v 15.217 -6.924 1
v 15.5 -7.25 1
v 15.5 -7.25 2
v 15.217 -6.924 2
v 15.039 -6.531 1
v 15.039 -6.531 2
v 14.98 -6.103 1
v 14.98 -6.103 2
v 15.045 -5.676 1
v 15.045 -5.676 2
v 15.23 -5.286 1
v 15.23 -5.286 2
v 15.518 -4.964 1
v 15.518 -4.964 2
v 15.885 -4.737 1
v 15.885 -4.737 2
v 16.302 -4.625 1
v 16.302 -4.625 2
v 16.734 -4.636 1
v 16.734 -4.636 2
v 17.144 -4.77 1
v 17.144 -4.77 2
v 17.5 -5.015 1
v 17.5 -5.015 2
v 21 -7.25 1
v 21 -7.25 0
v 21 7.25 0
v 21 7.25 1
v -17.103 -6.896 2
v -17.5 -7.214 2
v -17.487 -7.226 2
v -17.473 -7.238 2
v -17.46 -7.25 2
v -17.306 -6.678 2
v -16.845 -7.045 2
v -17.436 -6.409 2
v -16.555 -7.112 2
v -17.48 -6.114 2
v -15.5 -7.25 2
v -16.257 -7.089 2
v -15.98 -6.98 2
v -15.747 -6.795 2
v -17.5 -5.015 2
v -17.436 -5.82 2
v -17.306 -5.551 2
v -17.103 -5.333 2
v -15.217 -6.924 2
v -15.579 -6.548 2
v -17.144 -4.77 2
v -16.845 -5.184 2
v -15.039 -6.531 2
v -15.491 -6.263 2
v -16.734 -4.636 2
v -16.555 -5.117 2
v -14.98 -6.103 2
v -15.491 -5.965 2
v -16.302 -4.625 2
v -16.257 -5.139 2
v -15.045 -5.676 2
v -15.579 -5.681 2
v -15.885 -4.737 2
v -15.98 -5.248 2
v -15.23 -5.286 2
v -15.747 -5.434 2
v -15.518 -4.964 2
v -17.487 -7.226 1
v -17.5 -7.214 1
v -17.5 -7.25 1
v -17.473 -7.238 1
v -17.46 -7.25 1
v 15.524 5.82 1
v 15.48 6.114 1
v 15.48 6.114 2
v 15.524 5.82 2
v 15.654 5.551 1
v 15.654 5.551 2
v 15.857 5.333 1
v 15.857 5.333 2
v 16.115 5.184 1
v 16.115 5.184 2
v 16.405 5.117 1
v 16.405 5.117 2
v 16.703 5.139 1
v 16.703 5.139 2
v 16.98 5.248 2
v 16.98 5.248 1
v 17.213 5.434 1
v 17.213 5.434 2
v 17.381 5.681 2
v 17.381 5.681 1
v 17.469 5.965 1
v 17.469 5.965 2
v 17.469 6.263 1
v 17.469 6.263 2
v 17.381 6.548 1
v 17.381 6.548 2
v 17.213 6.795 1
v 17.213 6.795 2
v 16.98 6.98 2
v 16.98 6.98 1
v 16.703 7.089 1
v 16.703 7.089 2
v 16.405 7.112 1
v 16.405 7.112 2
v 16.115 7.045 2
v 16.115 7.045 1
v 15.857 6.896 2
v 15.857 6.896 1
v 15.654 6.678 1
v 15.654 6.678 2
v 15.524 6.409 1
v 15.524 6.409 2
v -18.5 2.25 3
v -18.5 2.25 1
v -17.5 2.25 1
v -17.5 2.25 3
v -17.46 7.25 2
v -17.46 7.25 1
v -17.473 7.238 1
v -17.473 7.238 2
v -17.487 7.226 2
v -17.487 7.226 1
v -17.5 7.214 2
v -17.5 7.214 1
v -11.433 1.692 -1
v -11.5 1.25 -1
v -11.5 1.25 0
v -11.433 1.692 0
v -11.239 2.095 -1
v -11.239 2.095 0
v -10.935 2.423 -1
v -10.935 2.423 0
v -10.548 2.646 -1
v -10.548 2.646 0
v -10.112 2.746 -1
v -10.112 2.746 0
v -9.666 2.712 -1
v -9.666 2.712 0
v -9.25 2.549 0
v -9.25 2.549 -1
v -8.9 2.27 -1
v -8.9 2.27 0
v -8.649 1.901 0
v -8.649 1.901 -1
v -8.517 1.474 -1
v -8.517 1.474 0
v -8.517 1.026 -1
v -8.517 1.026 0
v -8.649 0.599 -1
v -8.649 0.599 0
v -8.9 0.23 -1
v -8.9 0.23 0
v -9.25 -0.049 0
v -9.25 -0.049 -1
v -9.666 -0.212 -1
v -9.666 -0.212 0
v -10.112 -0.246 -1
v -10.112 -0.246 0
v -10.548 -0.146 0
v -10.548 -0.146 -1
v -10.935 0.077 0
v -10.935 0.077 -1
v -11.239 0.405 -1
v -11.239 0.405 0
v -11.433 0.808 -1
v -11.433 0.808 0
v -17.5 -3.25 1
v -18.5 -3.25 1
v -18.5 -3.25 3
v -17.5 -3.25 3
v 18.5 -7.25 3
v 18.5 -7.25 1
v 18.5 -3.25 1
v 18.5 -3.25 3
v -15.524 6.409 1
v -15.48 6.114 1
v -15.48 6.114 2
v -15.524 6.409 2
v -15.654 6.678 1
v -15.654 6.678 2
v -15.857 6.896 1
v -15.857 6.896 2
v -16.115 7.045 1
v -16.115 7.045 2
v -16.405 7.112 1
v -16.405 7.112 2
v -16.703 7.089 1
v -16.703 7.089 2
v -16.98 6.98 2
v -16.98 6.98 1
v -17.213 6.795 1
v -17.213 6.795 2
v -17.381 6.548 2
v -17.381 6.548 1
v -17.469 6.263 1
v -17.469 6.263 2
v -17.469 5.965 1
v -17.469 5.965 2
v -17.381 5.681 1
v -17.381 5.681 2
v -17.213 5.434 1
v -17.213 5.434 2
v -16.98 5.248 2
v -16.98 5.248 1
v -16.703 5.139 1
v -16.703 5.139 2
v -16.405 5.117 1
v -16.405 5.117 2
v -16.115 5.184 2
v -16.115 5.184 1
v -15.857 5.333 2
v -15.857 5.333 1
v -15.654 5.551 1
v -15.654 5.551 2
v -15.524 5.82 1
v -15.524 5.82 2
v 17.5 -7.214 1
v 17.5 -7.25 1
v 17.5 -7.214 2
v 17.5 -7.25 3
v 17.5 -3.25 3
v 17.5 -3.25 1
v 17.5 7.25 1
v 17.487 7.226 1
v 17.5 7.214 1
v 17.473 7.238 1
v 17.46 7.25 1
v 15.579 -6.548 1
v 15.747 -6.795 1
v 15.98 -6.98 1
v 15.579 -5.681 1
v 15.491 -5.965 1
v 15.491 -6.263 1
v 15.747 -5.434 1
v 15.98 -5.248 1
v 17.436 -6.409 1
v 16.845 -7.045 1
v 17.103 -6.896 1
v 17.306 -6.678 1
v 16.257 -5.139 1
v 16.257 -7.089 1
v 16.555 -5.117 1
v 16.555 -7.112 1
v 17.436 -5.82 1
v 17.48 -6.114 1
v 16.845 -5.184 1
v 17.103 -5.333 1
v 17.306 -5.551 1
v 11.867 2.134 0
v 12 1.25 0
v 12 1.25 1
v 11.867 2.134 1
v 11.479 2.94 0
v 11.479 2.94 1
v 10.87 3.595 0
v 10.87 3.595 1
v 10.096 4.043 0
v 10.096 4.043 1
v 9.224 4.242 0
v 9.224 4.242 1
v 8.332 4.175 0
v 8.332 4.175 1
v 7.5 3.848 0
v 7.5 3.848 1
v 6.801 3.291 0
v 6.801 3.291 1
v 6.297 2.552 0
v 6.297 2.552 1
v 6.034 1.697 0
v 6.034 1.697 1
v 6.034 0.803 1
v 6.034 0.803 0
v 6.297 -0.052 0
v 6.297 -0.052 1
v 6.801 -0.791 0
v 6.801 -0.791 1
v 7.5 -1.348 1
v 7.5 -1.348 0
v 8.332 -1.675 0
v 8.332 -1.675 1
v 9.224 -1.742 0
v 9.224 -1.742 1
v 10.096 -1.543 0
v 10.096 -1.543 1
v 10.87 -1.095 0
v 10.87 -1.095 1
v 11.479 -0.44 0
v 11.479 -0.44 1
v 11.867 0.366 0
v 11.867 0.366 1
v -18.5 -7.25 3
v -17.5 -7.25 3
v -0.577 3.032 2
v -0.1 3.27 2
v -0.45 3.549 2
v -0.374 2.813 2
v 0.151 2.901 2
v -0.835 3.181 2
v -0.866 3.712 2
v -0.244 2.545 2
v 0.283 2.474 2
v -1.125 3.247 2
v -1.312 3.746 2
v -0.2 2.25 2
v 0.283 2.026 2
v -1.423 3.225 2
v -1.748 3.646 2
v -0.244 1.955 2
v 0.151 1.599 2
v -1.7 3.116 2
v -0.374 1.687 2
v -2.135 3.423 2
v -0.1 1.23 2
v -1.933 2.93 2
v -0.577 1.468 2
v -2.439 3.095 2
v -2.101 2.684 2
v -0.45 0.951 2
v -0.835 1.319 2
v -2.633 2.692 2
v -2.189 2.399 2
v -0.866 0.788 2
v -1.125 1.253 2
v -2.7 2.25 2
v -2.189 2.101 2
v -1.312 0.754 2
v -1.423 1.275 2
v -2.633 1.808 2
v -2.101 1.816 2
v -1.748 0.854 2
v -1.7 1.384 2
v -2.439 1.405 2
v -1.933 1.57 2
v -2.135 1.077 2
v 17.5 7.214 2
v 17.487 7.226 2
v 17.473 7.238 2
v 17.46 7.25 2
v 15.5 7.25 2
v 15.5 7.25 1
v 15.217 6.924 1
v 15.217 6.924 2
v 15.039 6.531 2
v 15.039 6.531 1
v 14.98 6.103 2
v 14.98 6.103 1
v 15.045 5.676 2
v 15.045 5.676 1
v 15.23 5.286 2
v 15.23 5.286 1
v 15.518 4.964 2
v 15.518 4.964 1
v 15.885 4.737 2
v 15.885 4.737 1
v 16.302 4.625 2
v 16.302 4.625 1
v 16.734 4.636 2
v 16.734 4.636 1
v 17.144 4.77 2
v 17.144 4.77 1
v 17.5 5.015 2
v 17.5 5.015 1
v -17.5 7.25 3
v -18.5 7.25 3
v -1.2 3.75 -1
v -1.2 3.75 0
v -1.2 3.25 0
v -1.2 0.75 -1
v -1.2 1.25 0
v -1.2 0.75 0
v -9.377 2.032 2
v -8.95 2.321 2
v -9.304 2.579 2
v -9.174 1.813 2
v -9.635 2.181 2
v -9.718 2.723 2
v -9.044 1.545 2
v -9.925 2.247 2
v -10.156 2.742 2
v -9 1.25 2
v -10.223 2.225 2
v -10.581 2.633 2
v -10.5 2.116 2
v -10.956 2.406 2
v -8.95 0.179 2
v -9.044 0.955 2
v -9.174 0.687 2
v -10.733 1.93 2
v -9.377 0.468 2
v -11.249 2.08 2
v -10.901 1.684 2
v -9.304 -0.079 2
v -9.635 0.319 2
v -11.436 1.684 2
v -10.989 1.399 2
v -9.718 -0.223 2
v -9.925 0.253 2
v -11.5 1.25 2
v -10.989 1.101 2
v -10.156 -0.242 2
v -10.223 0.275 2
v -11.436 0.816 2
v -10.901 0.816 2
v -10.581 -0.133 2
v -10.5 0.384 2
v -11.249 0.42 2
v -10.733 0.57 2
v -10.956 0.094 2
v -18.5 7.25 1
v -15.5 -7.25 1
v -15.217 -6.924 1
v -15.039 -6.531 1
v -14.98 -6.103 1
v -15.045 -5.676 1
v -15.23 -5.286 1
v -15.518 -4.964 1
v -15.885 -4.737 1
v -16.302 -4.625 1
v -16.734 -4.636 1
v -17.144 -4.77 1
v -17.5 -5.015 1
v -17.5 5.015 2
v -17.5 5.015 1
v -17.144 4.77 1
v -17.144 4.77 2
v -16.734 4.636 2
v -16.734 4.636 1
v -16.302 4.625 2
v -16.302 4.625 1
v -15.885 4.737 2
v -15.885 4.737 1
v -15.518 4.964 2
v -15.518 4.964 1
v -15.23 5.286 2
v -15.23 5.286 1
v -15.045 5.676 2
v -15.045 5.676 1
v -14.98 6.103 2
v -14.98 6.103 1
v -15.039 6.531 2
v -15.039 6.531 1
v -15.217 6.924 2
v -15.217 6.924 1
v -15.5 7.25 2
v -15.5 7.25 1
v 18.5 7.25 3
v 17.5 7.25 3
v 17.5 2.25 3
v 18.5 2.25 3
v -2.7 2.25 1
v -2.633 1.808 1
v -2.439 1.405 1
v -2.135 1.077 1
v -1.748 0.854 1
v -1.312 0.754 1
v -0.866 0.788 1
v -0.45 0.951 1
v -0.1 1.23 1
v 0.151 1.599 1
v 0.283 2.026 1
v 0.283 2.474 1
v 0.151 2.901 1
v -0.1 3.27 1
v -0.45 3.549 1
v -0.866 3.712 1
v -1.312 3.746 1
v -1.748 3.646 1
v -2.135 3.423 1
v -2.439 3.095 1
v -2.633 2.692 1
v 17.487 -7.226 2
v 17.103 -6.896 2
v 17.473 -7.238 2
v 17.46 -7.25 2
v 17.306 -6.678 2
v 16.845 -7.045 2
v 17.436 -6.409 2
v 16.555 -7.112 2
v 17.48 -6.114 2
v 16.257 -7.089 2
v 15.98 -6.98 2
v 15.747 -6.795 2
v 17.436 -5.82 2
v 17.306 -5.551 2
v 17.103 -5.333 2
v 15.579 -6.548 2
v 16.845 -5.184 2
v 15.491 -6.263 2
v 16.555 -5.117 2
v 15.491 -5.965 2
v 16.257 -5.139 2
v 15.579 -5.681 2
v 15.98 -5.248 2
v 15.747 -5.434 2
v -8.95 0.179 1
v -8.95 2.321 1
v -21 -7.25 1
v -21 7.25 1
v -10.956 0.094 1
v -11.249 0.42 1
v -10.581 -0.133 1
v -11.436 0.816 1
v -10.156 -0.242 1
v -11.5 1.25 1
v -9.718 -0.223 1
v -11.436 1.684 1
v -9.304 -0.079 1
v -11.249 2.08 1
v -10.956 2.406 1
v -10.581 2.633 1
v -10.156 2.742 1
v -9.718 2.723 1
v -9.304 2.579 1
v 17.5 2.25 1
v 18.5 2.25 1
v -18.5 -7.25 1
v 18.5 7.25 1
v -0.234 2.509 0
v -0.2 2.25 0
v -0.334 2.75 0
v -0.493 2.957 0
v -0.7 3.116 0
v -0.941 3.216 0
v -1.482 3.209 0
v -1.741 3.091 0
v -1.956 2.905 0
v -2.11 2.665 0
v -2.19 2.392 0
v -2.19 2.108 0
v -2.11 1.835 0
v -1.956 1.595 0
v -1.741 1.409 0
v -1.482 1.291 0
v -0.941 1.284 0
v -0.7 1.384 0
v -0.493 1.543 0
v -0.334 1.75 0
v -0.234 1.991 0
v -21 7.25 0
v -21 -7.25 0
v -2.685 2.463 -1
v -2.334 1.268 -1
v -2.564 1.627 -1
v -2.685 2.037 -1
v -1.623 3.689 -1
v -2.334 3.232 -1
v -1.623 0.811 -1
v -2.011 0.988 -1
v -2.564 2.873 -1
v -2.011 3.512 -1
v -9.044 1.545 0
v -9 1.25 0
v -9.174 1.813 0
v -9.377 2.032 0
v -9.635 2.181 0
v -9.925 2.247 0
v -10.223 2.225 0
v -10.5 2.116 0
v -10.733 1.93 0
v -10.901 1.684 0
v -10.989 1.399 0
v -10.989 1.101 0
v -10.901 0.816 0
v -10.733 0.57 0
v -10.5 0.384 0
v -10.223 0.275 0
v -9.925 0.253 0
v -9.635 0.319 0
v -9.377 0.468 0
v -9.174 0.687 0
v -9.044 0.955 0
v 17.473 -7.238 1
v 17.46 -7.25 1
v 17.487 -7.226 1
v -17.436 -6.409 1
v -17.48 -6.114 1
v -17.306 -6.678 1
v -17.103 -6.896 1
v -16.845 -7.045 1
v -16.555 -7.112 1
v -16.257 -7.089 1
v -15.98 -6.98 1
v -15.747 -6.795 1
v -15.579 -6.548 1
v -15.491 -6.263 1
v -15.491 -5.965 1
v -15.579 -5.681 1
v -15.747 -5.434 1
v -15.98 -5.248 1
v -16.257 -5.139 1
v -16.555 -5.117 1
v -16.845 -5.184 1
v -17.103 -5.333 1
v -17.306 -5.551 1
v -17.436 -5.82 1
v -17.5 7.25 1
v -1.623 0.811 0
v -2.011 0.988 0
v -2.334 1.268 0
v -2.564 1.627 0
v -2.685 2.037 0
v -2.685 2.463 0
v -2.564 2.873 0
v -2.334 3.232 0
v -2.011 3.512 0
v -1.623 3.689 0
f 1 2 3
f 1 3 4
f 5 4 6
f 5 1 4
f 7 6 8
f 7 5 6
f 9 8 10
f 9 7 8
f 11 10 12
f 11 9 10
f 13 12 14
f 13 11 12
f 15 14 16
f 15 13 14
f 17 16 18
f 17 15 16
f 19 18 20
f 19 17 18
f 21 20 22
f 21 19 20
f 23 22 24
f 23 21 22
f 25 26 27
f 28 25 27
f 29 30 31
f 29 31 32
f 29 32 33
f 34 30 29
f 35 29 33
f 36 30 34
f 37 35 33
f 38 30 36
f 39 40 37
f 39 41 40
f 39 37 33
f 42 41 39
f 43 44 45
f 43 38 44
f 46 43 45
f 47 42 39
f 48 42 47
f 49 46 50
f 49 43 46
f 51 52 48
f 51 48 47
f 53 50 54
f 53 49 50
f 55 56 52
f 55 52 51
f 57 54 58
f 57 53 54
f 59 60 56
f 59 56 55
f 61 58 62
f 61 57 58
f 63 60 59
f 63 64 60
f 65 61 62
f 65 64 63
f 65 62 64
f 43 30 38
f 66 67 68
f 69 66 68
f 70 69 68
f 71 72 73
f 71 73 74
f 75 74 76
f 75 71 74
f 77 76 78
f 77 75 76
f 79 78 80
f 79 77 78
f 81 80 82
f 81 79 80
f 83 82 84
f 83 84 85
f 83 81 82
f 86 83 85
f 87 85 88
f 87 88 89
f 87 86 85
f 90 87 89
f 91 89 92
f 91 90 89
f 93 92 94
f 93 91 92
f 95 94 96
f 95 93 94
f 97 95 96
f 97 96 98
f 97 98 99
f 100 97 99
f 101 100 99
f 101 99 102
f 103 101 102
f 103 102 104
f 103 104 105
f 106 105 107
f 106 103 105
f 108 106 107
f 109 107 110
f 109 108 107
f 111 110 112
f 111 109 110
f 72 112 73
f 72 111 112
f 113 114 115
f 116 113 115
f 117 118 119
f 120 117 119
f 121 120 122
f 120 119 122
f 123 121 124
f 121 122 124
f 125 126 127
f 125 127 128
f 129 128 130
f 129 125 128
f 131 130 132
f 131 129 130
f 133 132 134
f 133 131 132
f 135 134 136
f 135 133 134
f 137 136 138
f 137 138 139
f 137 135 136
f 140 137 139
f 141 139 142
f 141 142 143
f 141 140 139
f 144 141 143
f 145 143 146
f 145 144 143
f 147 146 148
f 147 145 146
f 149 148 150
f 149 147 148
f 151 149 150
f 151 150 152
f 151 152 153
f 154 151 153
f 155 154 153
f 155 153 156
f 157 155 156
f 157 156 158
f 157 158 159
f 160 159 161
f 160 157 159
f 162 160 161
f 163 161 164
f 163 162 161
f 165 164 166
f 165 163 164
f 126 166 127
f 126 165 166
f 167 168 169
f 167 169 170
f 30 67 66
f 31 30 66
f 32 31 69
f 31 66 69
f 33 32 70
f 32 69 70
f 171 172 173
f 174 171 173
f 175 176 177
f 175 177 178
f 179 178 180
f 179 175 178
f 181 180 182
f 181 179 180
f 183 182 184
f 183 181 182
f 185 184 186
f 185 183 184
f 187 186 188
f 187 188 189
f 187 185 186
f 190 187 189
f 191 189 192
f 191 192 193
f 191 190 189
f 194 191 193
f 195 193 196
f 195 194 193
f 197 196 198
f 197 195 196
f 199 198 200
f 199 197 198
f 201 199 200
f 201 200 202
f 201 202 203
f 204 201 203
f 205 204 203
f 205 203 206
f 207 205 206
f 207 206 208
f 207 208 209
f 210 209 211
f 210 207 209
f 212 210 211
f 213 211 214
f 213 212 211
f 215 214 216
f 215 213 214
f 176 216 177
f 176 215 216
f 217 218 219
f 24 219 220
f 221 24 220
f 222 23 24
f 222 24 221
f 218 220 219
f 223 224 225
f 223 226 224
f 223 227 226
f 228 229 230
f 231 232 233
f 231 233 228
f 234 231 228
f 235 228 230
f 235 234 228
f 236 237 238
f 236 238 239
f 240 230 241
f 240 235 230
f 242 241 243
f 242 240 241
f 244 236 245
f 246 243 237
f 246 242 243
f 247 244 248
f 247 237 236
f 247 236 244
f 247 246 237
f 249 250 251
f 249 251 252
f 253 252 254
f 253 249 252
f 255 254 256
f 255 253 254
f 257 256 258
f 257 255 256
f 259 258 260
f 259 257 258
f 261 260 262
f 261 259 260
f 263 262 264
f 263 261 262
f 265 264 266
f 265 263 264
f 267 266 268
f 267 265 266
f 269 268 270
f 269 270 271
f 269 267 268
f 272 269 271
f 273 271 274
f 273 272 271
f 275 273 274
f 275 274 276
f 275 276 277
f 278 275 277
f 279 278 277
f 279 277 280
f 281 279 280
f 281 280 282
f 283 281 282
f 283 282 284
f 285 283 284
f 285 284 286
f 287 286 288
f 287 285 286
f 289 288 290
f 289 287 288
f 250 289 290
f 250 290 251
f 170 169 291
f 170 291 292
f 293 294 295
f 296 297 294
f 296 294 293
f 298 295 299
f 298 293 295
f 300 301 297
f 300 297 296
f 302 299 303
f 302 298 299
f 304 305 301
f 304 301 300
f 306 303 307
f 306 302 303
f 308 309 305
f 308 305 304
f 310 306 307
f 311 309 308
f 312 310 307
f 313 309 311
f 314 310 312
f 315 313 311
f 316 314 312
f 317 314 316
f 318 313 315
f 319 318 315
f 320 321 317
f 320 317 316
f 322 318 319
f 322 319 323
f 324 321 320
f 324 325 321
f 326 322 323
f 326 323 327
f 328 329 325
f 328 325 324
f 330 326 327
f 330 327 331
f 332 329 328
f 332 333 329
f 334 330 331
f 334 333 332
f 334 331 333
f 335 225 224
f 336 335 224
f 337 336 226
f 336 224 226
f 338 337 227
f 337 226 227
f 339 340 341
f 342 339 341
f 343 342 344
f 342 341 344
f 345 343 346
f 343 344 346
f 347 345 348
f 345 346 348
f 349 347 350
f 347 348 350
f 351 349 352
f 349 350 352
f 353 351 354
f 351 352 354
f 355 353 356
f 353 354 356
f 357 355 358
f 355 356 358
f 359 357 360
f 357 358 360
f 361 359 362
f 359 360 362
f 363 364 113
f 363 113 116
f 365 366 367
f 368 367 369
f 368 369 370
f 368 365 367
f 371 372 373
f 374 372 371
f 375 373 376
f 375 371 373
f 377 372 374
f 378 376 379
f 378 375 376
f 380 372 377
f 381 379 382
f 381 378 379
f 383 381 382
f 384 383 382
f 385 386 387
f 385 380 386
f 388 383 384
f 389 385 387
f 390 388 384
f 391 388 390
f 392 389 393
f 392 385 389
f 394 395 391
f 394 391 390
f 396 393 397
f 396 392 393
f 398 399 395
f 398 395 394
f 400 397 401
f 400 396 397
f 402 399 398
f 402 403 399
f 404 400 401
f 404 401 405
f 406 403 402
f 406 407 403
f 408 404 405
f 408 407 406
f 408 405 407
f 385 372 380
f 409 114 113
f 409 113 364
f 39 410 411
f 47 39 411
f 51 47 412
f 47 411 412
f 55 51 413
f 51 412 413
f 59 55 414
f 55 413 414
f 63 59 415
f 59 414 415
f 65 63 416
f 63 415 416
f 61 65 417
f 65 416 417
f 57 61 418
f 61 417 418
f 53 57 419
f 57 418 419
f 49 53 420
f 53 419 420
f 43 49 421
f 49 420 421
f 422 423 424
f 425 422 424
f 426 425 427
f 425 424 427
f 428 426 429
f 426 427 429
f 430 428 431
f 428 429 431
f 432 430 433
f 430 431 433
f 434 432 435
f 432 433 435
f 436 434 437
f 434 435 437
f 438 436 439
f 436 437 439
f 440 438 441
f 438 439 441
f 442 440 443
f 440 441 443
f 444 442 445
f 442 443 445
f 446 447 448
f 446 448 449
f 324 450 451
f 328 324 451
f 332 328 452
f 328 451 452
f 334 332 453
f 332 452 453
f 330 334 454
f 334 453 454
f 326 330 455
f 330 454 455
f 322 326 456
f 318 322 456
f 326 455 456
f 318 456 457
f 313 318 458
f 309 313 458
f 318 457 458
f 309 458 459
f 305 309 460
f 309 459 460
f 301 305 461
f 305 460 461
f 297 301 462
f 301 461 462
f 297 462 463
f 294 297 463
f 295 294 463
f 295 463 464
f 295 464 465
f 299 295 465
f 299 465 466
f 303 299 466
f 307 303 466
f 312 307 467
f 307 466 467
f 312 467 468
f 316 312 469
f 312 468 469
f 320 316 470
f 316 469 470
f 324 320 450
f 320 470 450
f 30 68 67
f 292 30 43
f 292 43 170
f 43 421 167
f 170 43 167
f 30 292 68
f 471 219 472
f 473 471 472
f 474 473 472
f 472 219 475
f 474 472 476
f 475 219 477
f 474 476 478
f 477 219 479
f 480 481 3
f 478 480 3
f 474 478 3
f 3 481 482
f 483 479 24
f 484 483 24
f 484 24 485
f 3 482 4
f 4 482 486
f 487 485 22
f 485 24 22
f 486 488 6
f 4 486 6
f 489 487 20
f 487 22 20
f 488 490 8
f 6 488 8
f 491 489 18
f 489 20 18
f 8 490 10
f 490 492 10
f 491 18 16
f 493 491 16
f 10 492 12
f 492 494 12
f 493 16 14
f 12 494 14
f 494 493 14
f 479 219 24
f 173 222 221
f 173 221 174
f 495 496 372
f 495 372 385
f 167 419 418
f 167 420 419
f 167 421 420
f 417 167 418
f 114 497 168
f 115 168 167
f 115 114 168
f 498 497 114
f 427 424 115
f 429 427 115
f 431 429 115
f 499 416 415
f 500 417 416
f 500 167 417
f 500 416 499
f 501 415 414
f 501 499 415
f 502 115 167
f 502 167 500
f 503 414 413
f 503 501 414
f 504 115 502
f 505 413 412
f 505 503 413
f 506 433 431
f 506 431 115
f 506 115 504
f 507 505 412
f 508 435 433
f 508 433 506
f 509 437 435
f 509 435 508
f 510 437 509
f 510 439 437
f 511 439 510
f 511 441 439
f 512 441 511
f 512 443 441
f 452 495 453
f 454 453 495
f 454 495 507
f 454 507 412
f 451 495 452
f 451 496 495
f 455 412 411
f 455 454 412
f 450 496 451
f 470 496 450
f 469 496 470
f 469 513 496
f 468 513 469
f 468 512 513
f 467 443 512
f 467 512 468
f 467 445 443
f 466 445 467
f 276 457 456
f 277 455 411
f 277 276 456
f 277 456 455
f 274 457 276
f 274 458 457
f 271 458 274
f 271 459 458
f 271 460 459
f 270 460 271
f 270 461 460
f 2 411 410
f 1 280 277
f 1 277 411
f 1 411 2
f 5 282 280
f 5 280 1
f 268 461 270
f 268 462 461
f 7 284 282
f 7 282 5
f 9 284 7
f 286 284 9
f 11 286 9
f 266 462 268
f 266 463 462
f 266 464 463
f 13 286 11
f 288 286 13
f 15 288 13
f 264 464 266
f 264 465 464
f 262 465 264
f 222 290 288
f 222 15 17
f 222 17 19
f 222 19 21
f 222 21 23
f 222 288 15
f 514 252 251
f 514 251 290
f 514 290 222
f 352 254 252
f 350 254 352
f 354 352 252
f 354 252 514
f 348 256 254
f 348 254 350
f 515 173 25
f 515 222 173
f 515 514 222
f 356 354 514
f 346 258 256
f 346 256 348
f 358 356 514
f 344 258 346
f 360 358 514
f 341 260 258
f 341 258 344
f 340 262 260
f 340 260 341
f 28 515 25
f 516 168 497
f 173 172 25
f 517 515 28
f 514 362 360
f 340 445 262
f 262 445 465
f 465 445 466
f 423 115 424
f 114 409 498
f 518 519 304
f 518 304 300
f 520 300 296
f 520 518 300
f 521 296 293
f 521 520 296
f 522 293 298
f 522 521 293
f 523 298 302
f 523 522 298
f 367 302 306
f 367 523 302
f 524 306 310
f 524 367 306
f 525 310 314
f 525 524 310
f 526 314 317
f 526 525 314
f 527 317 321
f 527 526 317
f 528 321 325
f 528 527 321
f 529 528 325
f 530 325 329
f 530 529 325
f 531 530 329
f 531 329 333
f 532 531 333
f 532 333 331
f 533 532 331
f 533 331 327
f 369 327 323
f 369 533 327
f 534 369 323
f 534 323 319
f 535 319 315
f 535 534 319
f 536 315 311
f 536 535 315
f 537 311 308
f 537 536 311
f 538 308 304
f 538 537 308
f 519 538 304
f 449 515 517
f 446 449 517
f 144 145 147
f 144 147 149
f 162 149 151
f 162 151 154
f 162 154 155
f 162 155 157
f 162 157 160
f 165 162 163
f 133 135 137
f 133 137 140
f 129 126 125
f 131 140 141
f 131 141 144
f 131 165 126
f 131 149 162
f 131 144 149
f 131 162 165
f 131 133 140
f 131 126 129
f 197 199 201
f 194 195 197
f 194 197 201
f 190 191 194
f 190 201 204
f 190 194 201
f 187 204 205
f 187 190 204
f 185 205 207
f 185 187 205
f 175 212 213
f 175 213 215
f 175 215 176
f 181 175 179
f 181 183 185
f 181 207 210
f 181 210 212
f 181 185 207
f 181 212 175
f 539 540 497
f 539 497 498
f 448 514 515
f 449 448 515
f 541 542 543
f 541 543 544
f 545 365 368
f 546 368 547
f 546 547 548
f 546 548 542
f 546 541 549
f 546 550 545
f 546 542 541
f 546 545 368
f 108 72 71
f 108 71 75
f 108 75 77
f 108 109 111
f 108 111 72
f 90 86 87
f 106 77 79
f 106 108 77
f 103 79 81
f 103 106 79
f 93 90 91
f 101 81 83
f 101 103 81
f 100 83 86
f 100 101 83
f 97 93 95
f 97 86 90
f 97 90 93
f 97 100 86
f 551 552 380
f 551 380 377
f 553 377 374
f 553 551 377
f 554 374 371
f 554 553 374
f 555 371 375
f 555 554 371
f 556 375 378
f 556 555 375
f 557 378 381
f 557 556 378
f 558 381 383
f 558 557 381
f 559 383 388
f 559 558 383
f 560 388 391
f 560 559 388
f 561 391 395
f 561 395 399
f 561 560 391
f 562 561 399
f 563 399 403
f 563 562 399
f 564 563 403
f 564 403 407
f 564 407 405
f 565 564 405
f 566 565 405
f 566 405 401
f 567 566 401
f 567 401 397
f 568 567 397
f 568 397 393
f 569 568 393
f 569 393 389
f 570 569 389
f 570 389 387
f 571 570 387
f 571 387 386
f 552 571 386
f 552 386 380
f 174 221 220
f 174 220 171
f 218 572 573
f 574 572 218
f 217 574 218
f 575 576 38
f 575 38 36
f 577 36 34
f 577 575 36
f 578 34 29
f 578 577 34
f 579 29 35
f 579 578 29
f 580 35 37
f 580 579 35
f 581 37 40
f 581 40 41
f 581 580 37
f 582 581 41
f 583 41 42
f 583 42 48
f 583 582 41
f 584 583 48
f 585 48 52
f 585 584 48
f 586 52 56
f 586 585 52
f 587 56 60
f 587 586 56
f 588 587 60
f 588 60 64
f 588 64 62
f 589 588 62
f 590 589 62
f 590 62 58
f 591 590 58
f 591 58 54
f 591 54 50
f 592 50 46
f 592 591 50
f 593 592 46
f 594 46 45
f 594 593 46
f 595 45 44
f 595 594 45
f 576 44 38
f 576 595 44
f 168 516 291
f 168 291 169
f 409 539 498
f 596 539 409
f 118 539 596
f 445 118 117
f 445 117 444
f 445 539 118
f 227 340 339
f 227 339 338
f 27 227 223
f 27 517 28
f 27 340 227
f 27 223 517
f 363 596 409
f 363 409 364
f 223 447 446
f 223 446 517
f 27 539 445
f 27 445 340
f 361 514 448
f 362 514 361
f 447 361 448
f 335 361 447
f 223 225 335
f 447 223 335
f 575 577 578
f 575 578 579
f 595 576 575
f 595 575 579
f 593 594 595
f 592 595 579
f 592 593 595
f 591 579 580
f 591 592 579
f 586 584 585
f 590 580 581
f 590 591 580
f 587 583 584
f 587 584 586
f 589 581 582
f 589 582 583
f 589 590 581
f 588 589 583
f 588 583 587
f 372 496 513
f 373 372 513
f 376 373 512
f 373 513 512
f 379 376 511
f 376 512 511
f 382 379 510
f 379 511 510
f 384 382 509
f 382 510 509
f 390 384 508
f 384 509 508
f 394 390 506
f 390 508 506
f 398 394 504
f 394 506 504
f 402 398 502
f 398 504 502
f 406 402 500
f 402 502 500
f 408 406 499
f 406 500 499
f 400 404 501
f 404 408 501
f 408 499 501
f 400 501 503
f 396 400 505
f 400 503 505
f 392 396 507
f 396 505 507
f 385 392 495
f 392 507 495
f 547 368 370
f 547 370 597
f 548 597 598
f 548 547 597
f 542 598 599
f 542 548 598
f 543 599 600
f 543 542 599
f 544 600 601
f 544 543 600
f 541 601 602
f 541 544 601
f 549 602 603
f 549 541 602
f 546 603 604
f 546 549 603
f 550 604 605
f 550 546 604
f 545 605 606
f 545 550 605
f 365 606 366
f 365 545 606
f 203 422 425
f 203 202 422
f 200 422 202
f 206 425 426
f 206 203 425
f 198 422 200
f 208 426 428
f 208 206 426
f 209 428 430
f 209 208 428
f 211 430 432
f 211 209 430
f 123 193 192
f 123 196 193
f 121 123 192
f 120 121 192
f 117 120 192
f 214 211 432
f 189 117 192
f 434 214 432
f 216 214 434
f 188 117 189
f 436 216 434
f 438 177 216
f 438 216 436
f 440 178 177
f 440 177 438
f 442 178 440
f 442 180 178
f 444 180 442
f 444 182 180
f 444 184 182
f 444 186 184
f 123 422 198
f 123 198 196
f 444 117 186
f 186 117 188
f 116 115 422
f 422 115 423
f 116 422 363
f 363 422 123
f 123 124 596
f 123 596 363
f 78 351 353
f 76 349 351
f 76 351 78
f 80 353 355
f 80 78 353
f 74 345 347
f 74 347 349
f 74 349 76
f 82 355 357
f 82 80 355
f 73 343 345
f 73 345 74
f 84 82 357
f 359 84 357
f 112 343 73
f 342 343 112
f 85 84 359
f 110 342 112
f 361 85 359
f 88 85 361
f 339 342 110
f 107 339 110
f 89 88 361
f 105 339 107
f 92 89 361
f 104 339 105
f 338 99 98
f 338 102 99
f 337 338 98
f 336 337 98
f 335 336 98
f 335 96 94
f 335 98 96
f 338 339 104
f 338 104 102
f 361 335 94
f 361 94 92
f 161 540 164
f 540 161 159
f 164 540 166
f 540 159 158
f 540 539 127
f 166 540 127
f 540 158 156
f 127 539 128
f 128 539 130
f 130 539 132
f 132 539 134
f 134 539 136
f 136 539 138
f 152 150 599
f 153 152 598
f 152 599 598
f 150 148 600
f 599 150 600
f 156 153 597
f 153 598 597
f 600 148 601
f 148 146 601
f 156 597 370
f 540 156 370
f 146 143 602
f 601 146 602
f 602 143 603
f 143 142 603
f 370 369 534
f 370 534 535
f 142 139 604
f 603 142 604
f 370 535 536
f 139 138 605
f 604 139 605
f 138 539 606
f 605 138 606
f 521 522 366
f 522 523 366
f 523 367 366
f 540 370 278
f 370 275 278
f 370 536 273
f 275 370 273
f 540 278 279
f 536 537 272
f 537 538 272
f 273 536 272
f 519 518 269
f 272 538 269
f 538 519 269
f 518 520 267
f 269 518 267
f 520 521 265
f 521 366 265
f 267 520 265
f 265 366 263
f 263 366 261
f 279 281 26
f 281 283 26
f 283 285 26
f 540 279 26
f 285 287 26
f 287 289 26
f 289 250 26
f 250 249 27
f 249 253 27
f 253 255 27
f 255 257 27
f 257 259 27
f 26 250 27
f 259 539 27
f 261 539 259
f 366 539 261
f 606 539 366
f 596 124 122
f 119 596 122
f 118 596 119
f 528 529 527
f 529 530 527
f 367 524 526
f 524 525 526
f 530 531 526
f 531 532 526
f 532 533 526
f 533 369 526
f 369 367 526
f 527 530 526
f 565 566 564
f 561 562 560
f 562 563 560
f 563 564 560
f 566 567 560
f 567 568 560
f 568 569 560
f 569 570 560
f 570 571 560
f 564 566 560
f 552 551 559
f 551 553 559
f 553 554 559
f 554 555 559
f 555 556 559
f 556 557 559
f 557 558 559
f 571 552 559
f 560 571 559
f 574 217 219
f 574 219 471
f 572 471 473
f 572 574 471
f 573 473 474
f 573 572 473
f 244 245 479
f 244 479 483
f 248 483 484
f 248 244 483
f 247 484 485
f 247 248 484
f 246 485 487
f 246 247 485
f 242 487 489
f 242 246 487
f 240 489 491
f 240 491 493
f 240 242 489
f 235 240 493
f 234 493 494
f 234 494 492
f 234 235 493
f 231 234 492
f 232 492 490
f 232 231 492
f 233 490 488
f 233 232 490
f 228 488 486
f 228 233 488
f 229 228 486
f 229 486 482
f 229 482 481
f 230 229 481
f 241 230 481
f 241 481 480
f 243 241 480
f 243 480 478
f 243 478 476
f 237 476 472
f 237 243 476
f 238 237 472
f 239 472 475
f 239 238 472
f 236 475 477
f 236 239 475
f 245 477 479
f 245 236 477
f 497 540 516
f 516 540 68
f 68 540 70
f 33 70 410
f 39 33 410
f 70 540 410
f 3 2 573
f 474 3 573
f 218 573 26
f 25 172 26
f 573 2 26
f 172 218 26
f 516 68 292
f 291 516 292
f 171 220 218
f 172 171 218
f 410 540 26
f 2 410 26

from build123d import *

# Parameters (mm, degrees)
SCHIZZO2_W                   = 42
SCHIZZO2_H                   = 14.5
SCHIZZO2_R                   = 3
SCHIZZO2_R_2                 = 1
ESTRUSIONE_ESTRUSIONE1_DEPTH = 1
SCHIZZO4_W                   = 1
SCHIZZO4_H                   = 5
SCHIZZO4_H_2                 = 4
ESTRUSIONE_ESTRUSIONE2_DEPTH = 2
SCHIZZO5_R                   = 1.5
SCHIZZO5_R_2                 = 1
ESTRUSIONE_ESTRUSIONE3_DEPTH = 1
TAGLIO_ESTRUSIONE1_START     = -1
TAGLIO_ESTRUSIONE1_DEPTH     = 1
ESTRUSIONE_ESTRUSIONE4_START = 1
SCHIZZO7_R                   = 1.5
ESTRUSIONE_ESTRUSIONE4_DEPTH = 1


with BuildPart() as part:
    # Schizzo2 → Estrusione-Estrusione1 (new body)
    with BuildSketch(Plane.XY):
        Rectangle(SCHIZZO2_W, SCHIZZO2_H)
        with Locations((9, 1.25)):
            Circle(SCHIZZO2_R, mode=Mode.SUBTRACT)
        with Locations((-1.2, 2.25)):
            Circle(SCHIZZO2_R_2, mode=Mode.SUBTRACT)
        with Locations((-10, 1.25)):
            Circle(SCHIZZO2_R_2, mode=Mode.SUBTRACT)
    extrude(amount=ESTRUSIONE_ESTRUSIONE1_DEPTH)

    # Schizzo4 → Estrusione-Estrusione2 (add)
    with BuildSketch(Plane.XY.offset(1)):
        with Locations((18, 4.75)):
            Rectangle(SCHIZZO4_W, SCHIZZO4_H)
        with Locations((18, -5.25)):
            Rectangle(SCHIZZO4_W, SCHIZZO4_H_2)
        with Locations((-18, -5.25)):
            Rectangle(SCHIZZO4_W, SCHIZZO4_H_2)
        with Locations((-18, 4.75)):
            Rectangle(SCHIZZO4_W, SCHIZZO4_H)
    extrude(amount=ESTRUSIONE_ESTRUSIONE2_DEPTH)

    # Schizzo5 → Estrusione-Estrusione3 (add)
    # profile 1 of 6: a face of its own
    with BuildSketch(Plane.XY.offset(1)):
        with Locations(Location((-1.2, 2.25, 0), (0, 0, 180))):
            Circle(SCHIZZO5_R)
        with Locations((-1.2, 2.25)):
            Circle(SCHIZZO5_R_2, mode=Mode.SUBTRACT)
    # profile 2 of 6: a face of its own
    with BuildSketch(Plane.XY.offset(1)):
        with Locations(Location((-10, 1.25, 0), (0, 0, 180))):
            Circle(SCHIZZO5_R)
        with Locations((-10, 1.25)):
            Circle(SCHIZZO5_R_2, mode=Mode.SUBTRACT)
    # profile 3 of 6: a face of its own
    with BuildSketch(Plane.XY.offset(1)):
        with BuildLine():
            Line((-17.5, 7.214212601), (-17.5, 5.014576268))
            ThreePointArc((-17.5, 5.014576268), (-15.362109211, 5.114234355), (-15.5, 7.25))
            Line((-15.5, 7.25), (-17.46, 7.25))
            ThreePointArc((-17.46, 7.25), (-17.480160079, 7.232285223), (-17.5, 7.214212601))
        make_face()
        with Locations((-16.48, 6.114394435)):
            Circle(SCHIZZO5_R_2, mode=Mode.SUBTRACT)
    # profile 4 of 6: a face of its own
    with BuildSketch(Plane.XY.offset(1)):
        with BuildLine():
            Line((-17.46, -7.25), (-15.5, -7.25))
            ThreePointArc((-15.5, -7.25), (-15.362109211, -5.114234355), (-17.5, -5.014576268))
            Line((-17.5, -5.014576268), (-17.5, -7.214212601))
            ThreePointArc((-17.5, -7.214212601), (-17.480160079, -7.232285223), (-17.46, -7.25))
        make_face()
        with Locations(Location((-16.48, -6.114394435, 0), (0, 0, 180))):
            Circle(SCHIZZO5_R_2, mode=Mode.SUBTRACT)
    # profile 5 of 6: a face of its own
    with BuildSketch(Plane.XY.offset(1)):
        with BuildLine():
            Line((17.46, -7.25), (15.5, -7.25))
            ThreePointArc((15.5, -7.25), (15.362109211, -5.114234355), (17.5, -5.014576268))
            Line((17.5, -5.014576268), (17.5, -7.214212601))
            ThreePointArc((17.5, -7.214212601), (17.480160079, -7.232285223), (17.46, -7.25))
        make_face()
        with Locations((16.48, -6.114394435)):
            Circle(SCHIZZO5_R_2, mode=Mode.SUBTRACT)
    # profile 6 of 6: a face of its own
    with BuildSketch(Plane.XY.offset(1)):
        with BuildLine():
            Line((17.46, 7.25), (15.5, 7.25))
            ThreePointArc((15.5, 7.25), (15.362109211, 5.114234355), (17.5, 5.014576268))
            Line((17.5, 5.014576268), (17.5, 7.214212601))
            ThreePointArc((17.5, 7.214212601), (17.480160079, 7.232285223), (17.46, 7.25))
        make_face()
        with Locations(Location((16.48, 6.114394435, 0), (0, 0, 180))):
            Circle(SCHIZZO5_R_2, mode=Mode.SUBTRACT)
    extrude(amount=ESTRUSIONE_ESTRUSIONE3_DEPTH)

    # Schizzo6 → Taglio-Estrusione1 (cut)
    with BuildSketch(Plane.XY.offset(2).offset(TAGLIO_ESTRUSIONE1_START)):
        with BuildLine():
            Line((-8.949725473, 2.320945105), (-8.949725473, 0.179054895))
            ThreePointArc((-8.949725473, 0.179054895), (-8.5, 1.25), (-8.949725473, 2.320945105))
        make_face()
    extrude(amount=TAGLIO_ESTRUSIONE1_DEPTH, mode=Mode.SUBTRACT)

    # Schizzo7 → Estrusione-Estrusione4 (add)
    with BuildSketch(Plane(origin=(0, 0, 0), x_dir=(-1, 0, 0), z_dir=(0, 0, -1)).offset(ESTRUSIONE_ESTRUSIONE4_START)):
        with Locations((10, 1.25)):
            Circle(SCHIZZO7_R)
        with BuildLine():
            Line((1.2, 3.75), (1.2, 0.75))
            ThreePointArc((1.2, 0.75), (2.7, 2.25), (1.2, 3.75))
        make_face()
    extrude(amount=-ESTRUSIONE_ESTRUSIONE4_DEPTH)


solid = part.part
